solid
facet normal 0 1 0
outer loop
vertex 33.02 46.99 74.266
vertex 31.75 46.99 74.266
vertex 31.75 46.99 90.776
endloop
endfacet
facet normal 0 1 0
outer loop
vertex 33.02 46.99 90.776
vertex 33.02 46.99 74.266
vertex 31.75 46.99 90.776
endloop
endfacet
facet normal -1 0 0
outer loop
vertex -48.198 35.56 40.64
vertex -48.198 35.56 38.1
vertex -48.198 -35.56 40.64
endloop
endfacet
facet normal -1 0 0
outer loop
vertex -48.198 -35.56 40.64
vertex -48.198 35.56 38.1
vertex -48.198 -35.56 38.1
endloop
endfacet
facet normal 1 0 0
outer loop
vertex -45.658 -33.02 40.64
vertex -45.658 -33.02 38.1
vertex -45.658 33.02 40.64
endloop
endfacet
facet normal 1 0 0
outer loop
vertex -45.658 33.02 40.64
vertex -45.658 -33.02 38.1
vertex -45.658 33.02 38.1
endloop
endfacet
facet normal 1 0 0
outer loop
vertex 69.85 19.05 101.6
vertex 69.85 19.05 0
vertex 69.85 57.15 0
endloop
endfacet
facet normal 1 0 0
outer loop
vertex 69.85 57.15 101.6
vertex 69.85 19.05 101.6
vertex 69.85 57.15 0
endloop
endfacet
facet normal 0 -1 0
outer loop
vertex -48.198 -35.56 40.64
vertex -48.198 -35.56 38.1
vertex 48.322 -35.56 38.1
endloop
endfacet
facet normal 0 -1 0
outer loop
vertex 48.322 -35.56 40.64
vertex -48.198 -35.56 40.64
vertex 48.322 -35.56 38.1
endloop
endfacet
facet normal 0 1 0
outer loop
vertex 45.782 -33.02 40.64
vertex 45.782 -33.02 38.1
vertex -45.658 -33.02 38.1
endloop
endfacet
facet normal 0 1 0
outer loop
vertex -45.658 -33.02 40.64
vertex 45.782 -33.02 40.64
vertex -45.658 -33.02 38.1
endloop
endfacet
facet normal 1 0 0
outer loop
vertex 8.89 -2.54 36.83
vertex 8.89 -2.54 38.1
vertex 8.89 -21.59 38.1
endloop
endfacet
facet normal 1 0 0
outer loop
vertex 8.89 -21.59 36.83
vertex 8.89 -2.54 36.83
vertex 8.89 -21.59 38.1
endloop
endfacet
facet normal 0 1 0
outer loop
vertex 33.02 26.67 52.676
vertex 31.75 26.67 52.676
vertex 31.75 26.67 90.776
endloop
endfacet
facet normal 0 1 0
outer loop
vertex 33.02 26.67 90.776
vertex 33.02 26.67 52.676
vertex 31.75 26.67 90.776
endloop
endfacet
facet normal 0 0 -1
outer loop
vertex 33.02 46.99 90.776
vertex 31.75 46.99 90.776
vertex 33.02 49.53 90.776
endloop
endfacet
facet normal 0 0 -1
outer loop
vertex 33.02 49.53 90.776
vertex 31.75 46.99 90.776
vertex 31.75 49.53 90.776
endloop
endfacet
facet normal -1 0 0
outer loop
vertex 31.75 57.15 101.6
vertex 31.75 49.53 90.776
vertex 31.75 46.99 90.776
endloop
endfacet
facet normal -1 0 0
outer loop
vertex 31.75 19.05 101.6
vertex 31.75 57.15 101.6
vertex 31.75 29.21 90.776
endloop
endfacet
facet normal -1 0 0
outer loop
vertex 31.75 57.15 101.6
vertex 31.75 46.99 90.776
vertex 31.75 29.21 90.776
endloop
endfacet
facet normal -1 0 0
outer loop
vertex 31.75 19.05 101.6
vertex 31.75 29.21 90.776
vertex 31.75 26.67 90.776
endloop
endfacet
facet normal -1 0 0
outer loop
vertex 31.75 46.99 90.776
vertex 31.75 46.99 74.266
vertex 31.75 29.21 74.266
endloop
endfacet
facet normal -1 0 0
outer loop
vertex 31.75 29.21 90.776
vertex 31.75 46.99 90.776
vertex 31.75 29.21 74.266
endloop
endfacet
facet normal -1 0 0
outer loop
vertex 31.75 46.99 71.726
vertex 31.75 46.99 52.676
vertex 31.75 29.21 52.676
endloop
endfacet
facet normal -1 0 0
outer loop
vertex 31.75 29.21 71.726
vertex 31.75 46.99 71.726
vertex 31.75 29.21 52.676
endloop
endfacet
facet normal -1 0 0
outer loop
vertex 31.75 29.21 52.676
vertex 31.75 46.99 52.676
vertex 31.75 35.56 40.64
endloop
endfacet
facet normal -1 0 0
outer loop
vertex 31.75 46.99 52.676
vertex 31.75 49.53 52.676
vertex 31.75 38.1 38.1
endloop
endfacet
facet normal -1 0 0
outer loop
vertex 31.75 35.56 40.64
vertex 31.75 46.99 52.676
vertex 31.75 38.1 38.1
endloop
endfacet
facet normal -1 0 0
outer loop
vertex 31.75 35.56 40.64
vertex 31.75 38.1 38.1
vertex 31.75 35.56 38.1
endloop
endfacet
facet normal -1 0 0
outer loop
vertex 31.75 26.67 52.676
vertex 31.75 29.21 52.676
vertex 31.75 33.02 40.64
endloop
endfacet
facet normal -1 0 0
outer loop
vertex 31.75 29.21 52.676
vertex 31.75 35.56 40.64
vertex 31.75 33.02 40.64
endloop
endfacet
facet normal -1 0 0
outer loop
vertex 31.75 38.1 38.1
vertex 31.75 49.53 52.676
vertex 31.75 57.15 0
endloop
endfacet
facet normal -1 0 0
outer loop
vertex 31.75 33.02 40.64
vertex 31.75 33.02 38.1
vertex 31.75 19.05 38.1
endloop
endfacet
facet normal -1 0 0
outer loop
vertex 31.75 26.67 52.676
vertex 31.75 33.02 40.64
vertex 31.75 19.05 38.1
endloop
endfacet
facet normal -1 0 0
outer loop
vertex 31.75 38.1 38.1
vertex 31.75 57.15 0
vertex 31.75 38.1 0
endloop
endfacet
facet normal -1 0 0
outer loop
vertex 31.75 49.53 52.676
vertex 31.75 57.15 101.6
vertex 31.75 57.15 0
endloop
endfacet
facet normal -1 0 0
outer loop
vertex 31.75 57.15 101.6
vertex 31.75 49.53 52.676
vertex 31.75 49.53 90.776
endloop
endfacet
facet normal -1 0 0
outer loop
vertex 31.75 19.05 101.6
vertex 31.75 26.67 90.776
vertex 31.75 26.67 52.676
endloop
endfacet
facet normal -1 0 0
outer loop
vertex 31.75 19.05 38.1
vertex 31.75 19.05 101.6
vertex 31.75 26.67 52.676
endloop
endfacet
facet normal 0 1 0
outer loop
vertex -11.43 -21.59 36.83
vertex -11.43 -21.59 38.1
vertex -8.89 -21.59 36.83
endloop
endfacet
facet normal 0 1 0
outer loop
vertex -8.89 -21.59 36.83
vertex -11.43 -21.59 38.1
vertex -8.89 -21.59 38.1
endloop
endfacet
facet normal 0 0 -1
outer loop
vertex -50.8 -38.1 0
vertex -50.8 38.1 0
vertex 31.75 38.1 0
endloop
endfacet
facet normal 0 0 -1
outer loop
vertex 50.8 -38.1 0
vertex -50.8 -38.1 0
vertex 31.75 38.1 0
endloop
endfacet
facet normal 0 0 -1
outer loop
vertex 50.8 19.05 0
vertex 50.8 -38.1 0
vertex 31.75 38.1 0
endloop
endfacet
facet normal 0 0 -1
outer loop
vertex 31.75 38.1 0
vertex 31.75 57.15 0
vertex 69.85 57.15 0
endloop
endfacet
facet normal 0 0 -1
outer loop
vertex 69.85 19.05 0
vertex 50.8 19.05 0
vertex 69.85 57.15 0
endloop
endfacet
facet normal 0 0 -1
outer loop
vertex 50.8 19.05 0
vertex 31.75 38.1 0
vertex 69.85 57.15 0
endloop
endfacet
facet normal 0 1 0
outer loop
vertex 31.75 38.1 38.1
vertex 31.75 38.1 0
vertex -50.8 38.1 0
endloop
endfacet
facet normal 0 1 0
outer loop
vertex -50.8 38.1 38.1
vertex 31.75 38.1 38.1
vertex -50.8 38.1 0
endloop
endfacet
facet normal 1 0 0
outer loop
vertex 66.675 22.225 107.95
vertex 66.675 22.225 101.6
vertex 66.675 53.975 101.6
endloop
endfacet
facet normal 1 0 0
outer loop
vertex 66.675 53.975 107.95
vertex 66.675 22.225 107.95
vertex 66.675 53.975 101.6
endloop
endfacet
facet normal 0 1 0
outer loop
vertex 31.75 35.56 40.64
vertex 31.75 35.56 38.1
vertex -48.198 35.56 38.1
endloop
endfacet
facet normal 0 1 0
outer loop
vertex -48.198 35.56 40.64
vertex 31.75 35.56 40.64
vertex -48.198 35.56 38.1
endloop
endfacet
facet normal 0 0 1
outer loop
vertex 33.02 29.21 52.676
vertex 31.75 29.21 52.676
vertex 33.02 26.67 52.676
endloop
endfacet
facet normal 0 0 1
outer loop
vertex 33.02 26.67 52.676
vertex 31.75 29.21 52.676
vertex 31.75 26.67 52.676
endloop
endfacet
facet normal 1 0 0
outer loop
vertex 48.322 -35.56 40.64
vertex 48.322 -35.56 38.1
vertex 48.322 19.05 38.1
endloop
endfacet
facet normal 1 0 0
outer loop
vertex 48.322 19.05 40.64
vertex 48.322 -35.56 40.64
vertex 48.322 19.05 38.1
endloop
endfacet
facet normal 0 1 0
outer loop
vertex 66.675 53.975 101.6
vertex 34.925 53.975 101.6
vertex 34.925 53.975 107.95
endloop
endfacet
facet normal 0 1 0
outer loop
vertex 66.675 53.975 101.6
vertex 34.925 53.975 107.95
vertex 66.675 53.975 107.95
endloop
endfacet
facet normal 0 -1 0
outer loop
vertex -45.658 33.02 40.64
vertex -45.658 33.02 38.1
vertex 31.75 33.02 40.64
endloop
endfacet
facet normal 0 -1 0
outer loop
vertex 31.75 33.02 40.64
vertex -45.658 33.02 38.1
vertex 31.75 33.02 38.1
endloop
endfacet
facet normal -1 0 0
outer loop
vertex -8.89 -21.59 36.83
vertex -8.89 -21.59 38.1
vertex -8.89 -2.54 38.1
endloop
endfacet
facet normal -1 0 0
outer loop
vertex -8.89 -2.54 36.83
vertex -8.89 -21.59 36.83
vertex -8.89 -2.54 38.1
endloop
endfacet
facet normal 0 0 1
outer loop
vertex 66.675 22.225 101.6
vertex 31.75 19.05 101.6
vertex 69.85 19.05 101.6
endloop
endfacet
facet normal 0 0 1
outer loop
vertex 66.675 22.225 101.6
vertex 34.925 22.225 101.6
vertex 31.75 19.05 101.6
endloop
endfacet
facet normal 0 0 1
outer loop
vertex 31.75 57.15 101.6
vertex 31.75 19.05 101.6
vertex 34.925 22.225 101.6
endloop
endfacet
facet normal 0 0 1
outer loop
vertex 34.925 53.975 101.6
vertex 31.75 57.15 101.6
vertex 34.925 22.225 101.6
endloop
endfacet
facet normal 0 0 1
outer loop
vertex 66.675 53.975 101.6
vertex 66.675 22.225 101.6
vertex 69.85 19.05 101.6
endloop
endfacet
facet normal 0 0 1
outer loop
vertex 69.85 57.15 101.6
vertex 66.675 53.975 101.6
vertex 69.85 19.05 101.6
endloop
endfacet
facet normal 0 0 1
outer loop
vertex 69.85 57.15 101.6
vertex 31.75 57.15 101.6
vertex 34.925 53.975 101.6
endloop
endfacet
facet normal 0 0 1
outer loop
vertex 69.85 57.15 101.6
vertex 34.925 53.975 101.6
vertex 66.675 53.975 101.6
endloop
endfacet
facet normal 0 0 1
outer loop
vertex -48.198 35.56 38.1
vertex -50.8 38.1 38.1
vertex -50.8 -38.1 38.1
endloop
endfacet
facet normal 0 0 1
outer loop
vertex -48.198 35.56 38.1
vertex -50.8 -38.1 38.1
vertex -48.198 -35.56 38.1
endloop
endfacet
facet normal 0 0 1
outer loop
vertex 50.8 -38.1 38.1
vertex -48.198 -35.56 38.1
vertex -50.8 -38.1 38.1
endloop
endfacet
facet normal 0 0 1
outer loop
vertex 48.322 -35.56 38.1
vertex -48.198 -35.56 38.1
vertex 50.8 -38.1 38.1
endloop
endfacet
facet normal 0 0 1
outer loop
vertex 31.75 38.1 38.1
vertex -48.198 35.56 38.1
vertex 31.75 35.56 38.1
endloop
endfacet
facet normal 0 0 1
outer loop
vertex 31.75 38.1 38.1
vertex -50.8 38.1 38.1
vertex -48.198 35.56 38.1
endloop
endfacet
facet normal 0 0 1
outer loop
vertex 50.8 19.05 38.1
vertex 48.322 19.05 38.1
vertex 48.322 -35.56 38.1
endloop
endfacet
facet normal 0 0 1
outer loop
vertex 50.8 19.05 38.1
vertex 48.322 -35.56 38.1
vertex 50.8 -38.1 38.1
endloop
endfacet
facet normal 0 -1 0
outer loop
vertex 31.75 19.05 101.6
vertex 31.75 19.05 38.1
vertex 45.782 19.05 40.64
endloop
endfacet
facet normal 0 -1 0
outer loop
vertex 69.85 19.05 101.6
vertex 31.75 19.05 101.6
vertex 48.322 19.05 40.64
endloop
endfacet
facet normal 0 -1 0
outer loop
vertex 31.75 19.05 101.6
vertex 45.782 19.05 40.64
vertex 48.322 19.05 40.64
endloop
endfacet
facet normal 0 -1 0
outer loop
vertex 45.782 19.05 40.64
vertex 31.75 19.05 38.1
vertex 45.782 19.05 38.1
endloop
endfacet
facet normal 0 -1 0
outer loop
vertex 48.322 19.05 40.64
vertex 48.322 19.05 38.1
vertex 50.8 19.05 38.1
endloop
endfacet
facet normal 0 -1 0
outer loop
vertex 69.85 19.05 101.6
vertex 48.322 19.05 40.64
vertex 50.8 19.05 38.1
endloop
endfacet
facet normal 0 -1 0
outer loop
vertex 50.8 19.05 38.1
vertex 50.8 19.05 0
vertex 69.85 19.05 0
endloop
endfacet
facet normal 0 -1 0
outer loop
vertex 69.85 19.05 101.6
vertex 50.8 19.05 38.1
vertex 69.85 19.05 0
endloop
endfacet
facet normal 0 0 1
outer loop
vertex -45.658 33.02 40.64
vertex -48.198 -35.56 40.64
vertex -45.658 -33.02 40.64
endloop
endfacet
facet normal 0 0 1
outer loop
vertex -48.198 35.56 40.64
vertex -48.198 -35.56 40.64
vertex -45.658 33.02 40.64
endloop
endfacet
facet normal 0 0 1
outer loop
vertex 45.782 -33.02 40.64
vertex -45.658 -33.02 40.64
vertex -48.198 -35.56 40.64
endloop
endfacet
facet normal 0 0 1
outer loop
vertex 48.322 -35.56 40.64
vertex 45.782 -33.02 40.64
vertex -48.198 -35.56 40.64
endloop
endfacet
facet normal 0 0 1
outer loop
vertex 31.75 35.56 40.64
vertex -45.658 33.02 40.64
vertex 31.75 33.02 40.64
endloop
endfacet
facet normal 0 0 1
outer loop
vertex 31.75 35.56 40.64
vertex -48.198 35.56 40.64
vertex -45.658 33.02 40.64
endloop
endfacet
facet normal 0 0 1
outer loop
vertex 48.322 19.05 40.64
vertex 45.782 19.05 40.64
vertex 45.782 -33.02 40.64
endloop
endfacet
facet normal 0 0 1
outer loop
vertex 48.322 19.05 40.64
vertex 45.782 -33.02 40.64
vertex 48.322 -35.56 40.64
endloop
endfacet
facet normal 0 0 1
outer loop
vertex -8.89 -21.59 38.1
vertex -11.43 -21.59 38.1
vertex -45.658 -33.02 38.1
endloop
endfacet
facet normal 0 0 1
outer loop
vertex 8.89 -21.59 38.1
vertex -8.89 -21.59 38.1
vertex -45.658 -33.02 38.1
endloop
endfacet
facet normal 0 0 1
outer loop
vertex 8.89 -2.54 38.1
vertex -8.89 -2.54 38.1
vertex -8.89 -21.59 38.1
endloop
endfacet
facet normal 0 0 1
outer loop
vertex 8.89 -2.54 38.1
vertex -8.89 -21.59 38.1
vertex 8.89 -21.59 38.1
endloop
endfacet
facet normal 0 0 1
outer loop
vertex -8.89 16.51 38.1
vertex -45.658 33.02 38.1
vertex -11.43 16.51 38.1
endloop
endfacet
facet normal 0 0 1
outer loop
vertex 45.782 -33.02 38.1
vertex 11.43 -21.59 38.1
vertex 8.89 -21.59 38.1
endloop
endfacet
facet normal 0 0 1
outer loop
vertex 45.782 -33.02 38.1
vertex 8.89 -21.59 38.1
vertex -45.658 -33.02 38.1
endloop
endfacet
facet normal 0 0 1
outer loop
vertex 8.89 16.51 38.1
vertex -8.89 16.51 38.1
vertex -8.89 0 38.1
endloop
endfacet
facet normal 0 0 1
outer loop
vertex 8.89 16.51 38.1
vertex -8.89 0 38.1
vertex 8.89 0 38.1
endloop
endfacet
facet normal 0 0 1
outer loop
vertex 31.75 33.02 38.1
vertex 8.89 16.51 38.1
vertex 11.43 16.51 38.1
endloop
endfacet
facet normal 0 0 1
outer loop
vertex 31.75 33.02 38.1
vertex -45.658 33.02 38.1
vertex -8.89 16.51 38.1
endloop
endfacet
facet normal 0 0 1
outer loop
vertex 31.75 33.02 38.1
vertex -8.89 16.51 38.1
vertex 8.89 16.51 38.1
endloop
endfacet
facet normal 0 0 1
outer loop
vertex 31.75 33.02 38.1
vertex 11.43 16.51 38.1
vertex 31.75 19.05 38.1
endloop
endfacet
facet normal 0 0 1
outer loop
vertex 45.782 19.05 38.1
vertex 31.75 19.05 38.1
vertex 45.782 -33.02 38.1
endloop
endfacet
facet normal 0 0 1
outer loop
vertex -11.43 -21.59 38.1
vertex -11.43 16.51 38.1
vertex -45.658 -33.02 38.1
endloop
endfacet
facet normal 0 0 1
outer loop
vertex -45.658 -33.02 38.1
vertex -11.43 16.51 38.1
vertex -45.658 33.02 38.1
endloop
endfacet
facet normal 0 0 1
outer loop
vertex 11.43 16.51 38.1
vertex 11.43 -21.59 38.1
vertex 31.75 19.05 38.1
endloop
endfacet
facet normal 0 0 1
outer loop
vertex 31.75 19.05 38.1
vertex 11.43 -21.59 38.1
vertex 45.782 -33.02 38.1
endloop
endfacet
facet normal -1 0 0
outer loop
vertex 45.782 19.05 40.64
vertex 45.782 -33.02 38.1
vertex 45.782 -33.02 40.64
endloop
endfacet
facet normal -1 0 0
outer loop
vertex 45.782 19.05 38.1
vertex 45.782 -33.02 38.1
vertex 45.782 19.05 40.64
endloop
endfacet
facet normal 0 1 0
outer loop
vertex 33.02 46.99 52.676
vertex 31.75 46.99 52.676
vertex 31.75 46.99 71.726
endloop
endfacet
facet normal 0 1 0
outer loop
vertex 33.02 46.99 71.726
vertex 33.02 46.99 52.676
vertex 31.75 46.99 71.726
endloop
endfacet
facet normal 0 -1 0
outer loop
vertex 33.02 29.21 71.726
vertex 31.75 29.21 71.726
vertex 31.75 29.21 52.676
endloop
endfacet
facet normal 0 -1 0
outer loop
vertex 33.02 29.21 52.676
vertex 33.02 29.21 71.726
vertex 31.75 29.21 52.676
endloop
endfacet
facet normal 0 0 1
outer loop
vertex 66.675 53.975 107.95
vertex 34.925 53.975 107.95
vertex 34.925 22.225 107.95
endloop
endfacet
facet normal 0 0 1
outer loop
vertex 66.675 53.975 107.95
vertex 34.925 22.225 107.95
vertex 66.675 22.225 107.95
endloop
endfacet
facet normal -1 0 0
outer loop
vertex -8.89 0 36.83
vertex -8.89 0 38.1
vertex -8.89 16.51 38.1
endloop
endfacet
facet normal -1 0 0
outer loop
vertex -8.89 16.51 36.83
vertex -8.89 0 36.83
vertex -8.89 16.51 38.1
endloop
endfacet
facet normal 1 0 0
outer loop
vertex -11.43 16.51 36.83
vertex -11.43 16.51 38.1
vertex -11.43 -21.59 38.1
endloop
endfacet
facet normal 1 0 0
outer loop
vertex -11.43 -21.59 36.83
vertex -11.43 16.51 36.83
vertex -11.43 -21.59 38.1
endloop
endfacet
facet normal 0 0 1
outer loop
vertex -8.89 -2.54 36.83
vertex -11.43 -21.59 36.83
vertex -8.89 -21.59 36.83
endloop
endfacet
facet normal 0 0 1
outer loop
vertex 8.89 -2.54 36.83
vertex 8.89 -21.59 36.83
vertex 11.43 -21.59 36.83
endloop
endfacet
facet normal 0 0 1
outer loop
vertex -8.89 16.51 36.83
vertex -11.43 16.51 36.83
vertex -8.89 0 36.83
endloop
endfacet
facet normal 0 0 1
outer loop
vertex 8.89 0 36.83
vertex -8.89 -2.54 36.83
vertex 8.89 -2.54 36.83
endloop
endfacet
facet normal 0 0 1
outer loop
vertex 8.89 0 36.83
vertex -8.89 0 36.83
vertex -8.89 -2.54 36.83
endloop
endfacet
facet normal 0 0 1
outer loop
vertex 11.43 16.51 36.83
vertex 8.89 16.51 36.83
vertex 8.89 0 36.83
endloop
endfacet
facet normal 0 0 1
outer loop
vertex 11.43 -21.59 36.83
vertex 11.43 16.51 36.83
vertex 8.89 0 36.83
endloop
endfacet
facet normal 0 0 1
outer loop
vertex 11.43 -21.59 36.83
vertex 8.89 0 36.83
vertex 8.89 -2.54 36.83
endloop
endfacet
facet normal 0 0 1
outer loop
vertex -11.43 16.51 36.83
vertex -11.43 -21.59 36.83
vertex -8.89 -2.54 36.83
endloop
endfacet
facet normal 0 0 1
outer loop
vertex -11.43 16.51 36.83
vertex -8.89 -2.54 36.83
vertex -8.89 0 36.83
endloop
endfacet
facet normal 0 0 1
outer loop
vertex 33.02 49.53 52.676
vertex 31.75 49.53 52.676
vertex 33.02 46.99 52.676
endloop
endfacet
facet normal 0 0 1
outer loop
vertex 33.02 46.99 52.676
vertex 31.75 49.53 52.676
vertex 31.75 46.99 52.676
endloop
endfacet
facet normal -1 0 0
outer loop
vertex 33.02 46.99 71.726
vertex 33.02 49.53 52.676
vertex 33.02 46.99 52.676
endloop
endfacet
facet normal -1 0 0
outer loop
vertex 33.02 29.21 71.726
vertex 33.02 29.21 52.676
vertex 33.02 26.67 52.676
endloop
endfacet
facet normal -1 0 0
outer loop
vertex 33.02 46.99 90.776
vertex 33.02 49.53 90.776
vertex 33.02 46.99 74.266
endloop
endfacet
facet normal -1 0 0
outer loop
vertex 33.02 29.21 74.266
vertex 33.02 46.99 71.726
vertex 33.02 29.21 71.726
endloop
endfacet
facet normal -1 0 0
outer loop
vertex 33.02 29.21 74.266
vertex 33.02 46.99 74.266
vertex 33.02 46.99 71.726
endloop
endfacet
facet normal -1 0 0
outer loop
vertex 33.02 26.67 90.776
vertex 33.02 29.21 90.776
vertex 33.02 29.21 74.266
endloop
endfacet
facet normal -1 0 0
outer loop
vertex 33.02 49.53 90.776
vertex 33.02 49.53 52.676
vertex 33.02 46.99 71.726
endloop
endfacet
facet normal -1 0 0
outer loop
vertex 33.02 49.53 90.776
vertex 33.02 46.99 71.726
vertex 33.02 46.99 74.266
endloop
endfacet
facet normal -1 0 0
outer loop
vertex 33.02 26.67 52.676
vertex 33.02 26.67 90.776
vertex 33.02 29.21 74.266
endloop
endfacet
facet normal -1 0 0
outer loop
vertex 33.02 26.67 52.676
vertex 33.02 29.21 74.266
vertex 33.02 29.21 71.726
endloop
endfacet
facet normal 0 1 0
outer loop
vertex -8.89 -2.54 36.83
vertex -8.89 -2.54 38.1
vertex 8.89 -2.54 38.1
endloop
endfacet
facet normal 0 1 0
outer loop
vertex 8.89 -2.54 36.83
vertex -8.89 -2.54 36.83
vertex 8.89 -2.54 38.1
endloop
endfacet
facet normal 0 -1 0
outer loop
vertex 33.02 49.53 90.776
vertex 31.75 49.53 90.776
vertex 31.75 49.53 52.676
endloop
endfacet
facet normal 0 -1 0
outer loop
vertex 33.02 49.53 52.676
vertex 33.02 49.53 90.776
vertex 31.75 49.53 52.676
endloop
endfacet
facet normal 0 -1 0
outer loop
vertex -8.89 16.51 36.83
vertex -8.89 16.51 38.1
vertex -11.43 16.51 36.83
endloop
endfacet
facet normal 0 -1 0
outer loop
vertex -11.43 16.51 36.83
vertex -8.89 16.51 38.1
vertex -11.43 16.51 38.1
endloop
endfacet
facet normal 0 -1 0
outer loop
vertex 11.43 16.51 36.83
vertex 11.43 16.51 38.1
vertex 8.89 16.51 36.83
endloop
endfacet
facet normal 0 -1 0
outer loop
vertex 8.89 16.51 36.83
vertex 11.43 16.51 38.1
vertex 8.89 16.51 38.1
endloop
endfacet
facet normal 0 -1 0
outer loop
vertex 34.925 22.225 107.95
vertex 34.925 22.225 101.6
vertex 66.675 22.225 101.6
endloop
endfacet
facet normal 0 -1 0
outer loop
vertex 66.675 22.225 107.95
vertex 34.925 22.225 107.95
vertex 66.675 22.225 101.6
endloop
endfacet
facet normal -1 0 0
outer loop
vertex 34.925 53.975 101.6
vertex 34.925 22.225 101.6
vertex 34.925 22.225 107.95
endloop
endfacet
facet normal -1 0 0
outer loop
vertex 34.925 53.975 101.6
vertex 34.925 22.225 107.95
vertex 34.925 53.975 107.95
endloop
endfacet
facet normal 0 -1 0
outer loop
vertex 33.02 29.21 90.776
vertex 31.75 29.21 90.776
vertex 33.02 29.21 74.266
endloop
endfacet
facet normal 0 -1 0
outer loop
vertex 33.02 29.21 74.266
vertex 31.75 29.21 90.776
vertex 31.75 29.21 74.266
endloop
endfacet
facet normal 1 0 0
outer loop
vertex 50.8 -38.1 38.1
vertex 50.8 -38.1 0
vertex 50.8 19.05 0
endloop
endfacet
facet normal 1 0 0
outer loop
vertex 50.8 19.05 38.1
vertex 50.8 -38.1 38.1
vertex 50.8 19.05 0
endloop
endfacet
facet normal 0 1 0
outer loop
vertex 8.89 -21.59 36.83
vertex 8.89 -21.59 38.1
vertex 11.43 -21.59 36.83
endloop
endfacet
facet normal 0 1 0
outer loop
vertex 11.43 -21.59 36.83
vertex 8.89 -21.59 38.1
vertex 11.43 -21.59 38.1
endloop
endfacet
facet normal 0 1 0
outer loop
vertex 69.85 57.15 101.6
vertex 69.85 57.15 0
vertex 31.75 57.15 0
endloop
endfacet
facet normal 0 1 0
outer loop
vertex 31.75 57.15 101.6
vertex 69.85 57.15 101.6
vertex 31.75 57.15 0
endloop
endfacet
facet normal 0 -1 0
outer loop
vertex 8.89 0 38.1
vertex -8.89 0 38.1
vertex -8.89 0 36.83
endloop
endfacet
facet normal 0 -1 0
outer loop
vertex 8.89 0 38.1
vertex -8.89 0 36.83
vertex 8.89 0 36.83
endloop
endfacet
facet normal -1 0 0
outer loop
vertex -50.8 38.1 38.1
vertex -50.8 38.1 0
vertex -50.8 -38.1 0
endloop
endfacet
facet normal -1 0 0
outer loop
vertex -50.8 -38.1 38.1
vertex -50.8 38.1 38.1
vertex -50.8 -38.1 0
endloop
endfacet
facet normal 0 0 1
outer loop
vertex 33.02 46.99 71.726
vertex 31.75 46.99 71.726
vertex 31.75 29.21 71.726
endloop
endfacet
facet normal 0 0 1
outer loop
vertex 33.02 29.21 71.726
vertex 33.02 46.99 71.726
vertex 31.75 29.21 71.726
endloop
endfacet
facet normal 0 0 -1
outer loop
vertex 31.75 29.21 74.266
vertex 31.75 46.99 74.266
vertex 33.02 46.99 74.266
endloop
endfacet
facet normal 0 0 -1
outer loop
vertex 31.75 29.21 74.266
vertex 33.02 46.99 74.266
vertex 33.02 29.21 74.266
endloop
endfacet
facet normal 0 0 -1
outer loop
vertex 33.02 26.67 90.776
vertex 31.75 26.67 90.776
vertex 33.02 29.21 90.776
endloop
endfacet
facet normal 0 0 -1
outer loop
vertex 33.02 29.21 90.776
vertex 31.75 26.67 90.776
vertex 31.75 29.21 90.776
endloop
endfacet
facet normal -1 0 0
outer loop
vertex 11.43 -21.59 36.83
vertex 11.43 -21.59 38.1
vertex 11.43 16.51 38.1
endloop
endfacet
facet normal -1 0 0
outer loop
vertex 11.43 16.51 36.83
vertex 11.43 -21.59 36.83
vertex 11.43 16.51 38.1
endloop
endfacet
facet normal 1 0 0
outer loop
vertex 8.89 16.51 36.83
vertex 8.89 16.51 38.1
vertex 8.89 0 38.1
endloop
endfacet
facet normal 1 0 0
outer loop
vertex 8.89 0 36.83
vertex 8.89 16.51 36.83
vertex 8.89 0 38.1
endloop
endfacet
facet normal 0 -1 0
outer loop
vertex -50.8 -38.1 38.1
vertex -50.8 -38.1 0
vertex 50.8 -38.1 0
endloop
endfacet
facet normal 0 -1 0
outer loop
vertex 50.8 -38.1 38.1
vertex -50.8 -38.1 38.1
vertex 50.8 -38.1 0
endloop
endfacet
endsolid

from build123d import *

# Parameters (mm, degrees)
F0_W      = 19.05
F0_H      = 19.05
F1_DEPTH  = 38.1
F2_DEPTH  = 101.6
F3_W      = 31.75
F3_H      = 31.75
F4_DEPTH  = 6.35
F5_W      = 17.78
F5_H      = 2.54
F6_DEPTH  = 1.27
F7_W      = 77.4077631491
F7_H      = 2.54
F7_W_2    = 2.54
F7_H_2    = 52.07
F8_DEPTH  = 2.54
F9_W      = 17.78
F9_H      = 2.54
F10_DEPTH = 1.27


with BuildPart() as f1:
    # F0 (on Top) → F1 (new body)
    with BuildSketch(Plane.XY):
        Polygon((31.75, 38.1), (-50.8, 38.1), (-50.8, -38.1), (50.8, -38.1), (50.8, 19.05), (31.75, 19.05), align=None)
        with Locations((41.275, 28.575)):
            Rectangle(F0_W, F0_H)
    extrude(amount=F1_DEPTH)

    # F0 (on Top) → F2 (join)
    with BuildSketch(Plane.XY):
        Polygon((31.75, 57.15), (31.75, 38.1), (50.8, 38.1), (50.8, 19.05), (69.85, 19.05), (69.85, 57.15), align=None)
        with Locations((41.275, 28.575)):
            Rectangle(F0_W, F0_H)
    extrude(amount=F2_DEPTH)

    # F3 (on face) → F4 (join)
    with BuildSketch(Plane.XY.offset(101.6)):
        with Locations((50.8, 38.1)):
            Rectangle(F3_W, F3_H)
    extrude(amount=F4_DEPTH)

    # F5 (on face) → F6 (cut)
    with BuildSketch(Plane.XY.offset(38.1)):
        with Locations((0, -1.27)):
            Rectangle(F5_W, F5_H)
        Polygon((-8.89, 16.51), (-11.43, 16.51), (-11.43, -21.59), (-8.89, -21.59), (-8.89, -2.54), (-8.89, 0), align=None)
        Polygon((11.43, -21.59), (11.43, 16.51), (8.89, 16.51), (8.89, 0), (8.89, -2.54), (8.89, -21.59), align=None)
    extrude(amount=-F6_DEPTH, mode=Mode.SUBTRACT)

    # F7 (on face) → F8 (join)
    with BuildSketch(Plane.XY.offset(38.1)):
        with Locations((-6.9538815746, 34.29)):
            Rectangle(F7_W, F7_H)
        Polygon((-45.6577631491, 35.56), (-48.1977631491, 35.56), (-48.1977631491, -35.56), (-45.6577631491, -35.56), (-45.6577631491, -33.02), (-45.6577631491, 33.02), align=None)
        Polygon((-45.6577631491, -33.02), (-45.6577631491, -35.56), (48.3222368509, -35.56), (48.3222368509, -33.02), (45.7822368509, -33.02), align=None)
        with Locations((47.0522368509, -6.985)):
            Rectangle(F7_W_2, F7_H_2)
    extrude(amount=F8_DEPTH)

    # F9 (on face) → F10 (cut)
    with BuildSketch(Plane(origin=(31.75, 0, 0), x_dir=(0, -1, 0), z_dir=(-1, 0, 0))):
        Polygon((-46.99, 90.7755655977), (-49.53, 90.7755655977), (-49.53, 52.6755655977), (-46.99, 52.6755655977), (-46.99, 71.7255655977), (-46.99, 74.2655655977), align=None)
        with Locations((-38.1, 72.9955655977)):
            Rectangle(F9_W, F9_H)
        Polygon((-29.21, 90.7755655977), (-29.21, 74.2655655977), (-29.21, 71.7255655977), (-29.21, 52.6755655977), (-26.67, 52.6755655977), (-26.67, 90.7755655977), align=None)
    extrude(amount=-F10_DEPTH, mode=Mode.SUBTRACT)


solid = f1.part
